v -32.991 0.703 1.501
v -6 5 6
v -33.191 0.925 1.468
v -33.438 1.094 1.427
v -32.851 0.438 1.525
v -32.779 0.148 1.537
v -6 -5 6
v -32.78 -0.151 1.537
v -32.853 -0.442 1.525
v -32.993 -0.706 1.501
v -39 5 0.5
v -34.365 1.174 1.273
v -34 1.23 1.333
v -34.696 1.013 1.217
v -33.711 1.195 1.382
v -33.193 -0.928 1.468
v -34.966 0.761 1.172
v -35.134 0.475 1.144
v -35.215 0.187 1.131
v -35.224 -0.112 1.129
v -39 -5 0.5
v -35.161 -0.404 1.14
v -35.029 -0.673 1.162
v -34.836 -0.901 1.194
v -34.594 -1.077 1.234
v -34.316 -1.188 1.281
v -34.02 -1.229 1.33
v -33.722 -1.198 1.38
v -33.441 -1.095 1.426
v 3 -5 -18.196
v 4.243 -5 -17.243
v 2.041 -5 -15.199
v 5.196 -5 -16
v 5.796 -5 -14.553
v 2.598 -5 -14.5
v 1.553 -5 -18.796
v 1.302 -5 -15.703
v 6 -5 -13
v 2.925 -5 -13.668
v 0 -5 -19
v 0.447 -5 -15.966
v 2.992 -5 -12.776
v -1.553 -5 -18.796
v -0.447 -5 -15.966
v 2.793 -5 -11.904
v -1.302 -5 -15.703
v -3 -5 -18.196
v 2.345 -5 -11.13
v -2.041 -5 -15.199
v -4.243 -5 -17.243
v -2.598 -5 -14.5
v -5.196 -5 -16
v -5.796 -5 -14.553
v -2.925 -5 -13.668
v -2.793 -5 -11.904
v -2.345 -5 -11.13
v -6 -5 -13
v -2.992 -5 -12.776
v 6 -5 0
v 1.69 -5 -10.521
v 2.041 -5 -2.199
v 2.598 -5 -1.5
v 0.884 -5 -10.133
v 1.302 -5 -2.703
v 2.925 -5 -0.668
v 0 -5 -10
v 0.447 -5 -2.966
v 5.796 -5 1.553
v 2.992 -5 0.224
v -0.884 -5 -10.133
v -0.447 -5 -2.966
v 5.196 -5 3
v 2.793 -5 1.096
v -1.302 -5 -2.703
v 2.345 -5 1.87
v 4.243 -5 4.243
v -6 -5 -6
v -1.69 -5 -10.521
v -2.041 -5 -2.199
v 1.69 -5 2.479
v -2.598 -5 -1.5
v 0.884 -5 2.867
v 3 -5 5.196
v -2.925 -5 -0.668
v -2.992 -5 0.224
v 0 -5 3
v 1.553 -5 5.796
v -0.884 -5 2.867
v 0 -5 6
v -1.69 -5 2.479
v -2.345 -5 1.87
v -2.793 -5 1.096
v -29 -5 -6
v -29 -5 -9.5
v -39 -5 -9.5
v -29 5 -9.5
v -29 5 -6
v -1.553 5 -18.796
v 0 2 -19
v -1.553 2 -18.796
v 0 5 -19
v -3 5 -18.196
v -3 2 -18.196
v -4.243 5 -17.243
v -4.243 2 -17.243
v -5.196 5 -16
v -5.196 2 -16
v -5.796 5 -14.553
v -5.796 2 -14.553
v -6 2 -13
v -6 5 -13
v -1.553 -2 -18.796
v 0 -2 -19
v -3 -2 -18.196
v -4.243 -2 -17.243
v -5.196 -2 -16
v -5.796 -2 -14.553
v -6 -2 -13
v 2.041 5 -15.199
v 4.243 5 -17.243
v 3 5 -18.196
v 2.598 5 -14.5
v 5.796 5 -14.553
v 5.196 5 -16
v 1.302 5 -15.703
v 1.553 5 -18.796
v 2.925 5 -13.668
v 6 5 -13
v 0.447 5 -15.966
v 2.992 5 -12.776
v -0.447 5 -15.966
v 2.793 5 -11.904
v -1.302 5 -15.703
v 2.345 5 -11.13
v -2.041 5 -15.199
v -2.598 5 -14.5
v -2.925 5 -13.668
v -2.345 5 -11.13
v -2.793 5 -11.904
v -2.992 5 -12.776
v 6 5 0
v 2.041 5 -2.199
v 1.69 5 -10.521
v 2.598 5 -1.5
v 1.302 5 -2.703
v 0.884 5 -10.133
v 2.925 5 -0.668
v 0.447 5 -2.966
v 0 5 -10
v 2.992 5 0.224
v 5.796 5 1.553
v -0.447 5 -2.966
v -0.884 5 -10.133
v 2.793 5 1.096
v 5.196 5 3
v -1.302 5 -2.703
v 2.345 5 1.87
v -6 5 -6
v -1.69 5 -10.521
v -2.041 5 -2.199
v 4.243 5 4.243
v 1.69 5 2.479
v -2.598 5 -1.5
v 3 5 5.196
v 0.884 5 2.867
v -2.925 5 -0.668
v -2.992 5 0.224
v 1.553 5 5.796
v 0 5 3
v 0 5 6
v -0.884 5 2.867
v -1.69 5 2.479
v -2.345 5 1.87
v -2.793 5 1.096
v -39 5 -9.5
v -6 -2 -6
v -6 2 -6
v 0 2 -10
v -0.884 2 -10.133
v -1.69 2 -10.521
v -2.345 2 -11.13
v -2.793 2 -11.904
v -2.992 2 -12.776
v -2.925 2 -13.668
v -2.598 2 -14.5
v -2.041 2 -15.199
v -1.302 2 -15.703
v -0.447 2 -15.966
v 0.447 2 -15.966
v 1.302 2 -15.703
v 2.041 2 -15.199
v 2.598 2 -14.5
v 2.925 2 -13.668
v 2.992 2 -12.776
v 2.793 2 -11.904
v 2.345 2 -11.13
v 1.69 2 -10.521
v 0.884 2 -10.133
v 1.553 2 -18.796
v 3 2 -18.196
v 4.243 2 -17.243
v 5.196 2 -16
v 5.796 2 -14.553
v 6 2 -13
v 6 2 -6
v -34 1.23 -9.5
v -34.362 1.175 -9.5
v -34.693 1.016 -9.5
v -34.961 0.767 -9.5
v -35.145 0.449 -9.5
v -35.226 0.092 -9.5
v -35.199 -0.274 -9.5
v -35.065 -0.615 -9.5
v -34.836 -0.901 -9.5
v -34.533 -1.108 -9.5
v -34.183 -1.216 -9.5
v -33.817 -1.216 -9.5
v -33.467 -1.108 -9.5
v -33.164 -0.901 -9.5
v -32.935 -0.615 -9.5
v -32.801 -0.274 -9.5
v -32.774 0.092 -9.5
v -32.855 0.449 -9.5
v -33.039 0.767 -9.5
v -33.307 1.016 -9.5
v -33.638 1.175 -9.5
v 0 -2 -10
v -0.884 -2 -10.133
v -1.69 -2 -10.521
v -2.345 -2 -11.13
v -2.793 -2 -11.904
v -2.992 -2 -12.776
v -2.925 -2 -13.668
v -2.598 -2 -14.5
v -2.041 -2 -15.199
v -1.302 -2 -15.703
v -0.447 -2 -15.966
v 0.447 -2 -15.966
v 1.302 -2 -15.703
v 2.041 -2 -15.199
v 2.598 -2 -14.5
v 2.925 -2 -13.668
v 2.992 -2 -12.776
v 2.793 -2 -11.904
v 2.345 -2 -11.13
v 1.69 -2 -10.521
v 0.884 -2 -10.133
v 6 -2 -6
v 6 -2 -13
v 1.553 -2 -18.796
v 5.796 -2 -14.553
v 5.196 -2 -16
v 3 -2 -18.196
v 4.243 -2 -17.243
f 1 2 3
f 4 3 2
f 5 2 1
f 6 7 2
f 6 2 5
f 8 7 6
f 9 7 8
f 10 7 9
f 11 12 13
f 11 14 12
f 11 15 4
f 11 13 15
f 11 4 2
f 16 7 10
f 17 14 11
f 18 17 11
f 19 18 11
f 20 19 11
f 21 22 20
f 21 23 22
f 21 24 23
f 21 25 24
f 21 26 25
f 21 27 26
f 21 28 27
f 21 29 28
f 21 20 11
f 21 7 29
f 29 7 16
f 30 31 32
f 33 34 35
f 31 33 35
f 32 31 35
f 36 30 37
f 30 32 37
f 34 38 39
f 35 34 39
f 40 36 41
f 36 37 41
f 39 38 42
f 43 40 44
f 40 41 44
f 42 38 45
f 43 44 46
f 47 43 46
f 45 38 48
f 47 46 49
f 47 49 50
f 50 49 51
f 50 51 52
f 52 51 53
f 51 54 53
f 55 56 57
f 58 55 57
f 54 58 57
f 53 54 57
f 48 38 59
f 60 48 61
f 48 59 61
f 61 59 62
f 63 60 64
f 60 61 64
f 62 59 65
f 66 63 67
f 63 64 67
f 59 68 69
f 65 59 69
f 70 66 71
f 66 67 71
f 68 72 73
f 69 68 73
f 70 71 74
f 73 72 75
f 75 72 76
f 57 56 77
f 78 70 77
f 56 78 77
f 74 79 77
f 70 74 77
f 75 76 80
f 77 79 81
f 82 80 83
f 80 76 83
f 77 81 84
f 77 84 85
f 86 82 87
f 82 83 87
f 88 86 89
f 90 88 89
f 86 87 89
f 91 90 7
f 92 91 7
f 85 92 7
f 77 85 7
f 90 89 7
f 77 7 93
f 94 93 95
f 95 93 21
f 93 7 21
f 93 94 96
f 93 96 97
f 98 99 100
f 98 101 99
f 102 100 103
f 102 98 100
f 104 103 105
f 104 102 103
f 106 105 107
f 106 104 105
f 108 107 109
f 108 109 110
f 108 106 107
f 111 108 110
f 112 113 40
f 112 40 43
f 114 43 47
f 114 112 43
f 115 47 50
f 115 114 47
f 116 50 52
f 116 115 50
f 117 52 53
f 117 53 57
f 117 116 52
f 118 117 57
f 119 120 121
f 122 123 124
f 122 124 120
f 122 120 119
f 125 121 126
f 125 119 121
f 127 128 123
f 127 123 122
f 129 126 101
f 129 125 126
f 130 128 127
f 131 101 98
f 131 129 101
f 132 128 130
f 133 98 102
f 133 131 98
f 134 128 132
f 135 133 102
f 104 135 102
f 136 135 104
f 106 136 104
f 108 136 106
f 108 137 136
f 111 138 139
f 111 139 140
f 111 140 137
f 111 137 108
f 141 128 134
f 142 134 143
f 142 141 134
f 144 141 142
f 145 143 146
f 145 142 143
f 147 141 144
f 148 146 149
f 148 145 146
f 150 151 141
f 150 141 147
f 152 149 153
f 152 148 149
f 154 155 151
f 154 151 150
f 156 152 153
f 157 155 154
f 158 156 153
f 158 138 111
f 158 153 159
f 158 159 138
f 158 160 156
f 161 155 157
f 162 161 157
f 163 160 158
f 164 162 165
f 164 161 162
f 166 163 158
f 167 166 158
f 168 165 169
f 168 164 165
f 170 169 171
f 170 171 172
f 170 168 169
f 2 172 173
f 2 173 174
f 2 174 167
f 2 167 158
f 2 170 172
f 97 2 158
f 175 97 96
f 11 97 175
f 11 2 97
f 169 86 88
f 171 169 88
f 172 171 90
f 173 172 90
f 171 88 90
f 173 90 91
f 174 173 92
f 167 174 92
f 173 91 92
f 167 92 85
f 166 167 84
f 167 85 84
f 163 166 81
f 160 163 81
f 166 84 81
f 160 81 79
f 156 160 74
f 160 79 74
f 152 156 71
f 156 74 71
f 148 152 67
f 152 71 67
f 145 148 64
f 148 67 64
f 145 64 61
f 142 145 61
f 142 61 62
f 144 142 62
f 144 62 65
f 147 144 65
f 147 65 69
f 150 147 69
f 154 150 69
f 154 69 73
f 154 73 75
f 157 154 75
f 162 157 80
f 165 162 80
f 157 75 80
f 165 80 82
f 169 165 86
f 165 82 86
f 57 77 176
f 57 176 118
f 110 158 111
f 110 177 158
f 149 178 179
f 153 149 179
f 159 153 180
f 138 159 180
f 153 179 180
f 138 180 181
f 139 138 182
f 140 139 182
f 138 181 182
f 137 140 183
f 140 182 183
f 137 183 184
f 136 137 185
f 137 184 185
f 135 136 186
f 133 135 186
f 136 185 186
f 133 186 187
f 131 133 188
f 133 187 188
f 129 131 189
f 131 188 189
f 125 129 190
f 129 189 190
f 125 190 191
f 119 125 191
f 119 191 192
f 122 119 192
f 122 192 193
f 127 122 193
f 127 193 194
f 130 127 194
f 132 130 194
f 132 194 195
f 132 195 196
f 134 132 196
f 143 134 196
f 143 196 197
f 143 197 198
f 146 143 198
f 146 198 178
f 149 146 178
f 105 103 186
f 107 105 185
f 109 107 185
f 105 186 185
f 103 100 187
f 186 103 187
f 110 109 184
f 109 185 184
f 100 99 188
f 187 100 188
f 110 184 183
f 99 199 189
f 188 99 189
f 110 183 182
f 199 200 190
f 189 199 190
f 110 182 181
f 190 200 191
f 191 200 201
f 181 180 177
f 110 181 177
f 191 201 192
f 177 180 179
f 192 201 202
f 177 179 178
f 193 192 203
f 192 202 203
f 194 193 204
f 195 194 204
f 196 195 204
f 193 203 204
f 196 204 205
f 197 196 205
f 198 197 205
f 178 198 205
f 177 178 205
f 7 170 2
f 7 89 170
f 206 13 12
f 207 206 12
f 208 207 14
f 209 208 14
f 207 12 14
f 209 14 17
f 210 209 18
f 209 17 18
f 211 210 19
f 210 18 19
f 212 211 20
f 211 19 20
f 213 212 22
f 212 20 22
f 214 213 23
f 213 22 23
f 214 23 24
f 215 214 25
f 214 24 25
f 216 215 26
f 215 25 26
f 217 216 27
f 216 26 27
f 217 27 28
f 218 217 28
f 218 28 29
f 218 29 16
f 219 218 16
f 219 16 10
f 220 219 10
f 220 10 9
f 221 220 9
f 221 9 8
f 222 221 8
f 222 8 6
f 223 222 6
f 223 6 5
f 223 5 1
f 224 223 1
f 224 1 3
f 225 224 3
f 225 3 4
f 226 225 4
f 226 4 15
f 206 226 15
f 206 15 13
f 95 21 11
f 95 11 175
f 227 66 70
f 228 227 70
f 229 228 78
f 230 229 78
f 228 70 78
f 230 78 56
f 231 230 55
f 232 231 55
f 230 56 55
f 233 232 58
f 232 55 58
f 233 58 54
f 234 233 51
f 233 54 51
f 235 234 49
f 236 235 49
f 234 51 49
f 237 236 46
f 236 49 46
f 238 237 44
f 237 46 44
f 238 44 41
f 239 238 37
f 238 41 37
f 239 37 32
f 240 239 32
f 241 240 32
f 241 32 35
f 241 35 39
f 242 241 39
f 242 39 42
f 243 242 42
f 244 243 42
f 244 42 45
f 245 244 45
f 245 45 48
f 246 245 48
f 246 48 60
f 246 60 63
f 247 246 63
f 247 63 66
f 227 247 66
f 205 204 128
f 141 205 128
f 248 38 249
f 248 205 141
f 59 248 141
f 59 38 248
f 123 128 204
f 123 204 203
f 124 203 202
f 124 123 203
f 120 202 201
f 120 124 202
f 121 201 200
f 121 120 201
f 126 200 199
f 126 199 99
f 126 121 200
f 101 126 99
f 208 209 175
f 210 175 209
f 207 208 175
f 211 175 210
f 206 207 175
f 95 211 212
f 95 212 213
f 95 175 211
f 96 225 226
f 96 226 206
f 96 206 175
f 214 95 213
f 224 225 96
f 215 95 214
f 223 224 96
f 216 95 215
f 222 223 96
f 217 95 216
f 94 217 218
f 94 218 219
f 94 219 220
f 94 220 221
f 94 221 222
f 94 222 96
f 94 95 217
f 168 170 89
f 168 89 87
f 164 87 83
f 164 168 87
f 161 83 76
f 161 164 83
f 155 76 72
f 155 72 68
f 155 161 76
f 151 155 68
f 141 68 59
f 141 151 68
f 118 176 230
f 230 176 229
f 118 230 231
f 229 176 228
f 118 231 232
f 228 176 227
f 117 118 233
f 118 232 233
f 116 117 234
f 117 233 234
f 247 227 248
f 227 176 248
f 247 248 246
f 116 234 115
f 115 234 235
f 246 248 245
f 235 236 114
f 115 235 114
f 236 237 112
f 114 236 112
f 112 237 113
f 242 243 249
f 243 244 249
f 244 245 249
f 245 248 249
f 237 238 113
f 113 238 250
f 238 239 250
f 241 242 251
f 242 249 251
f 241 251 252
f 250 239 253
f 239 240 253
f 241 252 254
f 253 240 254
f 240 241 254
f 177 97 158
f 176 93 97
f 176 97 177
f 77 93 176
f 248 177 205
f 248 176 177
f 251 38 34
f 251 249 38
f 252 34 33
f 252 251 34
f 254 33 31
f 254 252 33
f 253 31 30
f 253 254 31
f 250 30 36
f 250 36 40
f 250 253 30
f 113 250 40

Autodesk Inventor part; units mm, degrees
ref_plane "YZ Plane" through (0, 0, 0) normal (1, 0, 0) x (0, 1, 0)
ref_plane "XZ Plane" through (0, 0, 0) normal (0, 1, 0) x (-1, 0, 0)
ref_plane "XY Plane" through (0, 0, 0) normal (0, 0, 1) x (1, 0, 0)
sketch "Sketch1" plane through (0, 0, 0) normal (0, 1, 0) x (-1, 0, 0)
  circle A0 centre (0, 0) radius 3 construction
  line L0 (-6, 6) -> (6, 6)
  line L1 (6, 6) -> (39, 0.5)
  line L2 (39, 0.5) -> (39, -9.5)
  line L3 (39, -9.5) -> (29, -9.5)
  line L4 (-6, -19) -> (-6, 6)
  circle A1 centre (0, -13) radius 3 construction
  line L5 (29, -9.5) -> (29, -6)
  line L6 (29, -6) -> (6, -6)
  line L7 (6, -6) -> (6, -19)
  line L8 (6, -19) -> (-6, -19)
  dimension "d0" = 6
  dimension "d1" = 6
  dimension "d2" = 13
  dimension "d4" = 6
  dimension "d5" = 9.5
  dimension "d6" = 45
  dimension "d8" = 6
  dimension "d9" = 10
  dimension "d10" = 12
  dimension "d36" = 12
  dimension "d37" = 6
  dimension "d38" = 13
  dimension "d39" = 10
extrude "Extrusion1" add sketch "Sketch1" along normal mid plane 10
sketch "Sketch2" plane through (0, 5, 0) normal (0, 1, 0) x (1, 0, 0)
  circle A0 centre (0, 0) radius 3
  circle A1 centre (0, 13) radius 3
  dimension "d13" = 6
  dimension "d14" = 13
hole "Hole1" at (0, 5, 0) at (0, 5, -13) direction (0, -1, 0) diameter 6 end through all
sketch "Sketch3" plane through (6, -5, -19) normal (1, 0, 0) x (0, 0, -1)
  line L0 (0, 0) -> (0, 10) projected
  line L1 (0, 7) -> (-13, 7)
  line L2 (-13, 7) -> (-13, 3)
  line L3 (-13, 3) -> (0, 3)
  line L4 (0, 3) -> (0, 7)
  point P0 (-19, 5)
  point P1 (0, 3)
  dimension "d22" = 13
  dimension "d23" = 4
  dimension "d24" = 2
extrude "Extrusion2" cut sketch "Sketch3" against normal blind 12
sketch "Sketch4" plane through (-29, 5, -9.5) normal (0, 0, -1) x (-1, 0, 0)
  circle A0 centre (5, -5) radius 1.5
  line L0 (10, 0) -> (10, -10) projected
  point P0 (-29, -5)
  dimension "d27" = 3
  dimension "d28" = 5
hole "Hole2" at (-34, 0, -9.5) direction (0, 0, 1) diameter 2.459 end through all thread size "M3x0.5" class "6H" standard "ISO Metric profile"
fillet "Fillet1" radius 6 5 edges at (6, 0, 6) (6, 3.5, -19) (-6, 3.5, -19) (6, -3.5, -19) (-6, -3.5, -19)
equation "\"d15\" = d13"
equation "\"d24\" = 0.5 * d23"
properties part number "Gripper_Arm_Base" material "Aluminum 6061"
